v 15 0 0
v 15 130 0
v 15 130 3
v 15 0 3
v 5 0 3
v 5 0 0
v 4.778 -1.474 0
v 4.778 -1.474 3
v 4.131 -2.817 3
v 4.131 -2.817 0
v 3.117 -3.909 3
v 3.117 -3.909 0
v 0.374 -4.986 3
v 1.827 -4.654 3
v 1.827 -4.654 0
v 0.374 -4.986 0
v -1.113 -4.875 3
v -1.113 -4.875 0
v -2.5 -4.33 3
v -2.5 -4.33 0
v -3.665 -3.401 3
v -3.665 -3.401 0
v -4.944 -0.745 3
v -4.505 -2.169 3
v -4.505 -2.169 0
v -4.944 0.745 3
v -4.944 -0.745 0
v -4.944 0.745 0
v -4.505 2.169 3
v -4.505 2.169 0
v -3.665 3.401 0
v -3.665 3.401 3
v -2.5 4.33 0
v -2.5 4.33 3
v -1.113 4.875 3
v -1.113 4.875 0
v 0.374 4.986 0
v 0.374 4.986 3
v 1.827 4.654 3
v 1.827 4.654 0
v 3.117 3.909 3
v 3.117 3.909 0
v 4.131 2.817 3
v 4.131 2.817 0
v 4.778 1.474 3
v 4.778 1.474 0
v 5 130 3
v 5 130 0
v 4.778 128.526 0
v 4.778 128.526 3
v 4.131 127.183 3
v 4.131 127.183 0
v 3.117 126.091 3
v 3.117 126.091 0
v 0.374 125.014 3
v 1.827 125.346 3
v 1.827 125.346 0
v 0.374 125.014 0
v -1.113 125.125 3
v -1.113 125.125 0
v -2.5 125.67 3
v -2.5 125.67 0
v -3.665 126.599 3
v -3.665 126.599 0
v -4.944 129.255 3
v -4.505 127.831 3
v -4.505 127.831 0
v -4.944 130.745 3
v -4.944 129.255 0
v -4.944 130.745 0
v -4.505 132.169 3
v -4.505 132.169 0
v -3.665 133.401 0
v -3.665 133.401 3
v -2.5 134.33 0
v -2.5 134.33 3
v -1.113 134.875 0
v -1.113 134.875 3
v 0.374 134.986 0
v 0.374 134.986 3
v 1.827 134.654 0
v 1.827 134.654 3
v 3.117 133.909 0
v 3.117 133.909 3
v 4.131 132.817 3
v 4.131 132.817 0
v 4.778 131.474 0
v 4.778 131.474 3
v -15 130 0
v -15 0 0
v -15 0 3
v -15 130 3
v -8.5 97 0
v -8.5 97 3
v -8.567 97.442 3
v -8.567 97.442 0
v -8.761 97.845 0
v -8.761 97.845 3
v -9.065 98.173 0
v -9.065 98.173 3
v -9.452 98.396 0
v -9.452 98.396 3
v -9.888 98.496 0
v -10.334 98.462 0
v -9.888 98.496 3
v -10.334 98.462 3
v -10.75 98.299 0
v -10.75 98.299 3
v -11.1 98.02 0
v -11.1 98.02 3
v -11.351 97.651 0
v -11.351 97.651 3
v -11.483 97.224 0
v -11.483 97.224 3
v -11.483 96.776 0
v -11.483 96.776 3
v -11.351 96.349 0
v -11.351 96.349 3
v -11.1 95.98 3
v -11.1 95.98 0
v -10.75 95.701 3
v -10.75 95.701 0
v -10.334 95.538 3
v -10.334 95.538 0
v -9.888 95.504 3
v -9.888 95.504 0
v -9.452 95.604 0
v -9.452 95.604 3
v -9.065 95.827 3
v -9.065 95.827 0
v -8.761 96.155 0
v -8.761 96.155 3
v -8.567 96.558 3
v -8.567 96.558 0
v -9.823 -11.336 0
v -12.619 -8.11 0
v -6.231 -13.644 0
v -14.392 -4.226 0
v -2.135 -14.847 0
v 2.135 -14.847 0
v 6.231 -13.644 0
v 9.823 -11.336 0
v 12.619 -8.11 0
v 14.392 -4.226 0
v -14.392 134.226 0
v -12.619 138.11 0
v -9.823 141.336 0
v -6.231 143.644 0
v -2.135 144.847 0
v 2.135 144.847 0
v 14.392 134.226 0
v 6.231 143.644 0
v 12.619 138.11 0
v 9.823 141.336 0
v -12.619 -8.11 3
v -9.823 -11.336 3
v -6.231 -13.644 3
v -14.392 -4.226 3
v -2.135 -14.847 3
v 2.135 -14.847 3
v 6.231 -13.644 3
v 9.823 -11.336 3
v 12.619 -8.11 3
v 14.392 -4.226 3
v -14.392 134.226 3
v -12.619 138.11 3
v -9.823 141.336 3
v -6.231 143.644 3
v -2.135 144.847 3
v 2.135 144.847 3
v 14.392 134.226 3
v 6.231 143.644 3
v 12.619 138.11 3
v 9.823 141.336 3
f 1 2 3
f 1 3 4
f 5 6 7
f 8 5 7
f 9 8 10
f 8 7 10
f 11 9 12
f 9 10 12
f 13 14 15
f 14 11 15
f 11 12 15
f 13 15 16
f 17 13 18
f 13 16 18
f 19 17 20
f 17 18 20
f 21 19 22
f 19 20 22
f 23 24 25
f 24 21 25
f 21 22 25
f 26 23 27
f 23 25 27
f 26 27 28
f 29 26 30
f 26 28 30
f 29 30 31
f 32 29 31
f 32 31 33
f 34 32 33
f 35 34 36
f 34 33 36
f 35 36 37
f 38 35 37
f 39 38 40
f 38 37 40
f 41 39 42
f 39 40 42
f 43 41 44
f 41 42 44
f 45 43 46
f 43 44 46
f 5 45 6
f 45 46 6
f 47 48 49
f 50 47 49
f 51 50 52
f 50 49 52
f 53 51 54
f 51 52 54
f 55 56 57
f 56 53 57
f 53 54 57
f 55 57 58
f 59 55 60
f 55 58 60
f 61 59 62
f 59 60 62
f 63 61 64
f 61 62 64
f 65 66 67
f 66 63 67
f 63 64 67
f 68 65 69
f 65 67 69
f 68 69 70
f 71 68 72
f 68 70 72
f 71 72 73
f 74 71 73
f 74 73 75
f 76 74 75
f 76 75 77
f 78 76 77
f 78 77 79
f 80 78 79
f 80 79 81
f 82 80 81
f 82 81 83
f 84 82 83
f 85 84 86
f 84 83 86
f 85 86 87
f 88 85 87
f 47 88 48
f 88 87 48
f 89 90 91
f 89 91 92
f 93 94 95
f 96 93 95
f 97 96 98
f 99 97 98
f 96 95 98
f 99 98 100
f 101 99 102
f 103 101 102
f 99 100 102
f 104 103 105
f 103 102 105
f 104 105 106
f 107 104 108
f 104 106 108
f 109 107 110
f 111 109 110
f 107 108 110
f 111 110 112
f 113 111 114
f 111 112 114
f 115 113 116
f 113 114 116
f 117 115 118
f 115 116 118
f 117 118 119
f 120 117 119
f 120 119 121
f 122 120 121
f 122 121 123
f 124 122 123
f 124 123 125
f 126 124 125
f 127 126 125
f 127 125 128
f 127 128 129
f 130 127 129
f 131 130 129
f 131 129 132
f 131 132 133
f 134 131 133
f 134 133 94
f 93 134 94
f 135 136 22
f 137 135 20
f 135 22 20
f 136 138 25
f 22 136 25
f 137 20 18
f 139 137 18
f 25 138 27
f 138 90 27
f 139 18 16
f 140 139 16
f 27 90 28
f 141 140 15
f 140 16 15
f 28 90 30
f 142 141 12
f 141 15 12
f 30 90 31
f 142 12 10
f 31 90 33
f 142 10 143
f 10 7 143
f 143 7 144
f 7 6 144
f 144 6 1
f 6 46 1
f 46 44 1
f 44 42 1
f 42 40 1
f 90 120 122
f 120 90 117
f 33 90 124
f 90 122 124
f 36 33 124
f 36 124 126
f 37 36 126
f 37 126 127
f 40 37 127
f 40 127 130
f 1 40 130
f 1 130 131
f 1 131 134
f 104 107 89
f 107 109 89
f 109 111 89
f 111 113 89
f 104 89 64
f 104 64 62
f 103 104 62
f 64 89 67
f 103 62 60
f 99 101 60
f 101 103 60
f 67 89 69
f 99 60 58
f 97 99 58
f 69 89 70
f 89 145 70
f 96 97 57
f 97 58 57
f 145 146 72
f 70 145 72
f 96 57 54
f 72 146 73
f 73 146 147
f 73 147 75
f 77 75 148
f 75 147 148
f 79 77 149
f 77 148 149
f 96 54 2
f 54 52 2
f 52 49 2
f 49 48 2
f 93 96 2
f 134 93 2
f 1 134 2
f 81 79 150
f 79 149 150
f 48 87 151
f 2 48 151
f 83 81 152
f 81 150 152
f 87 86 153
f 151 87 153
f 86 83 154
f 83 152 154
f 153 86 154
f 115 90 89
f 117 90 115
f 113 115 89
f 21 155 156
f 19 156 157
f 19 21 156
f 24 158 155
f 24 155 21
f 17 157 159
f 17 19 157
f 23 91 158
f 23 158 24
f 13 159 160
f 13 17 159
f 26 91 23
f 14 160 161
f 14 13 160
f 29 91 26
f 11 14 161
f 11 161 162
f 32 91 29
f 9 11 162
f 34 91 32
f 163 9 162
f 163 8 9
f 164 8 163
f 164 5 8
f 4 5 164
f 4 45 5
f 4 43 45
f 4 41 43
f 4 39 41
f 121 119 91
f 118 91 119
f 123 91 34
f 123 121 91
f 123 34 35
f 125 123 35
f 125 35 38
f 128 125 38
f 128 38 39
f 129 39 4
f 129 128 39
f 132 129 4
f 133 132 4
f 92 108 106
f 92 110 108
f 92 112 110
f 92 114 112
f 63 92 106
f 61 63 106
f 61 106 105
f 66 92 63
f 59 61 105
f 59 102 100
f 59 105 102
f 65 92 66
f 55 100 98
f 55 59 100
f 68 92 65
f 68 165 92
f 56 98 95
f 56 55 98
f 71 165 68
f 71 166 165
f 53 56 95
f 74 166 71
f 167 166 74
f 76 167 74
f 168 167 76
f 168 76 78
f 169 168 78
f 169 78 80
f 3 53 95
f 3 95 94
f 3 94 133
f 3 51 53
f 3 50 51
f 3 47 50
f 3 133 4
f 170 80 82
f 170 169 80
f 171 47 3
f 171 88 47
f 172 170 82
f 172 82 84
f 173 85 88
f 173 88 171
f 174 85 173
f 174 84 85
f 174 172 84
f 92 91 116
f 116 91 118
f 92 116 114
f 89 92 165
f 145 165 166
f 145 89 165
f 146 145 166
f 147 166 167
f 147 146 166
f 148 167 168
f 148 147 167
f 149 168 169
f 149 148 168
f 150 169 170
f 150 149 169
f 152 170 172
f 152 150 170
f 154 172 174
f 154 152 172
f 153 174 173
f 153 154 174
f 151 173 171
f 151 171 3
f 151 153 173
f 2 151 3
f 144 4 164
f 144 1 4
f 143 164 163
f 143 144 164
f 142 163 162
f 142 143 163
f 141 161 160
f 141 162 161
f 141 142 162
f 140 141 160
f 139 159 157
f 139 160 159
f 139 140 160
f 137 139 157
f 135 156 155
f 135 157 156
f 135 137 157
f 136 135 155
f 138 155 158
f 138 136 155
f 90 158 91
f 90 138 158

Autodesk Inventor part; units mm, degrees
ref_plane "YZ Plane" through (0, 0, 0) normal (1, 0, 0) x (0, 1, 0)
ref_plane "XZ Plane" through (0, 0, 0) normal (0, 1, 0) x (-1, 0, 0)
ref_plane "XY Plane" through (0, 0, 0) normal (0, 0, 1) x (1, 0, 0)
sketch "Sketch1" plane through (0, 0, 0) normal (0, 0, 1) x (1, 0, 0)
  circle A0 centre (0, 0) radius 5
  circle A1 centre (0, 130) radius 5
  line L0 (-15, 145) -> (15, 145)
  line L1 (15, 145) -> (15, -15)
  line L2 (15, -15) -> (-15, -15)
  line L3 (-15, -15) -> (-15, 145)
  circle A2 centre (0, 130) radius 15
  circle A3 centre (0, 0) radius 15
  point P0 (15, 130)
  point P1 (-15, 130)
  point P2 (-15, 0)
  point P3 (15, 0)
  dimension "d0" = 10
  dimension "d1" = 10
  dimension "d2" = 130
  dimension "d3" = 30
  dimension "d4" = 15
  dimension "d5" = 15
  dimension "d6" = 15
  dimension "d7" = 30
  dimension "d8" = 30
sketch "Sketch2" plane through (0, 0, 0) normal (1, 0, 0) x (0, 1, 0)
  point P0 (0, 0)
extrude "Extrusion1" add sketch "Sketch1" along normal blind 3 contours A2 | A2 L1 A3 L3 | A3
sketch "Sketch3" plane through (0, 0, 3) normal (0, 0, 1) x (1, 0, 0)
  circle A0 centre (-10, 97) radius 1.5
  line L0 (-15, 130) -> (-15, 0) projected
  circle A1 centre (0, 130) radius 5 projected
  point P0 (0, 0)
  dimension "d11" = 3
  dimension "d12" = 5
  dimension "d13" = 33
extrude "Extrusion2" cut sketch "Sketch3" against normal blind 3 contours A0
properties part number "Link3Do"
